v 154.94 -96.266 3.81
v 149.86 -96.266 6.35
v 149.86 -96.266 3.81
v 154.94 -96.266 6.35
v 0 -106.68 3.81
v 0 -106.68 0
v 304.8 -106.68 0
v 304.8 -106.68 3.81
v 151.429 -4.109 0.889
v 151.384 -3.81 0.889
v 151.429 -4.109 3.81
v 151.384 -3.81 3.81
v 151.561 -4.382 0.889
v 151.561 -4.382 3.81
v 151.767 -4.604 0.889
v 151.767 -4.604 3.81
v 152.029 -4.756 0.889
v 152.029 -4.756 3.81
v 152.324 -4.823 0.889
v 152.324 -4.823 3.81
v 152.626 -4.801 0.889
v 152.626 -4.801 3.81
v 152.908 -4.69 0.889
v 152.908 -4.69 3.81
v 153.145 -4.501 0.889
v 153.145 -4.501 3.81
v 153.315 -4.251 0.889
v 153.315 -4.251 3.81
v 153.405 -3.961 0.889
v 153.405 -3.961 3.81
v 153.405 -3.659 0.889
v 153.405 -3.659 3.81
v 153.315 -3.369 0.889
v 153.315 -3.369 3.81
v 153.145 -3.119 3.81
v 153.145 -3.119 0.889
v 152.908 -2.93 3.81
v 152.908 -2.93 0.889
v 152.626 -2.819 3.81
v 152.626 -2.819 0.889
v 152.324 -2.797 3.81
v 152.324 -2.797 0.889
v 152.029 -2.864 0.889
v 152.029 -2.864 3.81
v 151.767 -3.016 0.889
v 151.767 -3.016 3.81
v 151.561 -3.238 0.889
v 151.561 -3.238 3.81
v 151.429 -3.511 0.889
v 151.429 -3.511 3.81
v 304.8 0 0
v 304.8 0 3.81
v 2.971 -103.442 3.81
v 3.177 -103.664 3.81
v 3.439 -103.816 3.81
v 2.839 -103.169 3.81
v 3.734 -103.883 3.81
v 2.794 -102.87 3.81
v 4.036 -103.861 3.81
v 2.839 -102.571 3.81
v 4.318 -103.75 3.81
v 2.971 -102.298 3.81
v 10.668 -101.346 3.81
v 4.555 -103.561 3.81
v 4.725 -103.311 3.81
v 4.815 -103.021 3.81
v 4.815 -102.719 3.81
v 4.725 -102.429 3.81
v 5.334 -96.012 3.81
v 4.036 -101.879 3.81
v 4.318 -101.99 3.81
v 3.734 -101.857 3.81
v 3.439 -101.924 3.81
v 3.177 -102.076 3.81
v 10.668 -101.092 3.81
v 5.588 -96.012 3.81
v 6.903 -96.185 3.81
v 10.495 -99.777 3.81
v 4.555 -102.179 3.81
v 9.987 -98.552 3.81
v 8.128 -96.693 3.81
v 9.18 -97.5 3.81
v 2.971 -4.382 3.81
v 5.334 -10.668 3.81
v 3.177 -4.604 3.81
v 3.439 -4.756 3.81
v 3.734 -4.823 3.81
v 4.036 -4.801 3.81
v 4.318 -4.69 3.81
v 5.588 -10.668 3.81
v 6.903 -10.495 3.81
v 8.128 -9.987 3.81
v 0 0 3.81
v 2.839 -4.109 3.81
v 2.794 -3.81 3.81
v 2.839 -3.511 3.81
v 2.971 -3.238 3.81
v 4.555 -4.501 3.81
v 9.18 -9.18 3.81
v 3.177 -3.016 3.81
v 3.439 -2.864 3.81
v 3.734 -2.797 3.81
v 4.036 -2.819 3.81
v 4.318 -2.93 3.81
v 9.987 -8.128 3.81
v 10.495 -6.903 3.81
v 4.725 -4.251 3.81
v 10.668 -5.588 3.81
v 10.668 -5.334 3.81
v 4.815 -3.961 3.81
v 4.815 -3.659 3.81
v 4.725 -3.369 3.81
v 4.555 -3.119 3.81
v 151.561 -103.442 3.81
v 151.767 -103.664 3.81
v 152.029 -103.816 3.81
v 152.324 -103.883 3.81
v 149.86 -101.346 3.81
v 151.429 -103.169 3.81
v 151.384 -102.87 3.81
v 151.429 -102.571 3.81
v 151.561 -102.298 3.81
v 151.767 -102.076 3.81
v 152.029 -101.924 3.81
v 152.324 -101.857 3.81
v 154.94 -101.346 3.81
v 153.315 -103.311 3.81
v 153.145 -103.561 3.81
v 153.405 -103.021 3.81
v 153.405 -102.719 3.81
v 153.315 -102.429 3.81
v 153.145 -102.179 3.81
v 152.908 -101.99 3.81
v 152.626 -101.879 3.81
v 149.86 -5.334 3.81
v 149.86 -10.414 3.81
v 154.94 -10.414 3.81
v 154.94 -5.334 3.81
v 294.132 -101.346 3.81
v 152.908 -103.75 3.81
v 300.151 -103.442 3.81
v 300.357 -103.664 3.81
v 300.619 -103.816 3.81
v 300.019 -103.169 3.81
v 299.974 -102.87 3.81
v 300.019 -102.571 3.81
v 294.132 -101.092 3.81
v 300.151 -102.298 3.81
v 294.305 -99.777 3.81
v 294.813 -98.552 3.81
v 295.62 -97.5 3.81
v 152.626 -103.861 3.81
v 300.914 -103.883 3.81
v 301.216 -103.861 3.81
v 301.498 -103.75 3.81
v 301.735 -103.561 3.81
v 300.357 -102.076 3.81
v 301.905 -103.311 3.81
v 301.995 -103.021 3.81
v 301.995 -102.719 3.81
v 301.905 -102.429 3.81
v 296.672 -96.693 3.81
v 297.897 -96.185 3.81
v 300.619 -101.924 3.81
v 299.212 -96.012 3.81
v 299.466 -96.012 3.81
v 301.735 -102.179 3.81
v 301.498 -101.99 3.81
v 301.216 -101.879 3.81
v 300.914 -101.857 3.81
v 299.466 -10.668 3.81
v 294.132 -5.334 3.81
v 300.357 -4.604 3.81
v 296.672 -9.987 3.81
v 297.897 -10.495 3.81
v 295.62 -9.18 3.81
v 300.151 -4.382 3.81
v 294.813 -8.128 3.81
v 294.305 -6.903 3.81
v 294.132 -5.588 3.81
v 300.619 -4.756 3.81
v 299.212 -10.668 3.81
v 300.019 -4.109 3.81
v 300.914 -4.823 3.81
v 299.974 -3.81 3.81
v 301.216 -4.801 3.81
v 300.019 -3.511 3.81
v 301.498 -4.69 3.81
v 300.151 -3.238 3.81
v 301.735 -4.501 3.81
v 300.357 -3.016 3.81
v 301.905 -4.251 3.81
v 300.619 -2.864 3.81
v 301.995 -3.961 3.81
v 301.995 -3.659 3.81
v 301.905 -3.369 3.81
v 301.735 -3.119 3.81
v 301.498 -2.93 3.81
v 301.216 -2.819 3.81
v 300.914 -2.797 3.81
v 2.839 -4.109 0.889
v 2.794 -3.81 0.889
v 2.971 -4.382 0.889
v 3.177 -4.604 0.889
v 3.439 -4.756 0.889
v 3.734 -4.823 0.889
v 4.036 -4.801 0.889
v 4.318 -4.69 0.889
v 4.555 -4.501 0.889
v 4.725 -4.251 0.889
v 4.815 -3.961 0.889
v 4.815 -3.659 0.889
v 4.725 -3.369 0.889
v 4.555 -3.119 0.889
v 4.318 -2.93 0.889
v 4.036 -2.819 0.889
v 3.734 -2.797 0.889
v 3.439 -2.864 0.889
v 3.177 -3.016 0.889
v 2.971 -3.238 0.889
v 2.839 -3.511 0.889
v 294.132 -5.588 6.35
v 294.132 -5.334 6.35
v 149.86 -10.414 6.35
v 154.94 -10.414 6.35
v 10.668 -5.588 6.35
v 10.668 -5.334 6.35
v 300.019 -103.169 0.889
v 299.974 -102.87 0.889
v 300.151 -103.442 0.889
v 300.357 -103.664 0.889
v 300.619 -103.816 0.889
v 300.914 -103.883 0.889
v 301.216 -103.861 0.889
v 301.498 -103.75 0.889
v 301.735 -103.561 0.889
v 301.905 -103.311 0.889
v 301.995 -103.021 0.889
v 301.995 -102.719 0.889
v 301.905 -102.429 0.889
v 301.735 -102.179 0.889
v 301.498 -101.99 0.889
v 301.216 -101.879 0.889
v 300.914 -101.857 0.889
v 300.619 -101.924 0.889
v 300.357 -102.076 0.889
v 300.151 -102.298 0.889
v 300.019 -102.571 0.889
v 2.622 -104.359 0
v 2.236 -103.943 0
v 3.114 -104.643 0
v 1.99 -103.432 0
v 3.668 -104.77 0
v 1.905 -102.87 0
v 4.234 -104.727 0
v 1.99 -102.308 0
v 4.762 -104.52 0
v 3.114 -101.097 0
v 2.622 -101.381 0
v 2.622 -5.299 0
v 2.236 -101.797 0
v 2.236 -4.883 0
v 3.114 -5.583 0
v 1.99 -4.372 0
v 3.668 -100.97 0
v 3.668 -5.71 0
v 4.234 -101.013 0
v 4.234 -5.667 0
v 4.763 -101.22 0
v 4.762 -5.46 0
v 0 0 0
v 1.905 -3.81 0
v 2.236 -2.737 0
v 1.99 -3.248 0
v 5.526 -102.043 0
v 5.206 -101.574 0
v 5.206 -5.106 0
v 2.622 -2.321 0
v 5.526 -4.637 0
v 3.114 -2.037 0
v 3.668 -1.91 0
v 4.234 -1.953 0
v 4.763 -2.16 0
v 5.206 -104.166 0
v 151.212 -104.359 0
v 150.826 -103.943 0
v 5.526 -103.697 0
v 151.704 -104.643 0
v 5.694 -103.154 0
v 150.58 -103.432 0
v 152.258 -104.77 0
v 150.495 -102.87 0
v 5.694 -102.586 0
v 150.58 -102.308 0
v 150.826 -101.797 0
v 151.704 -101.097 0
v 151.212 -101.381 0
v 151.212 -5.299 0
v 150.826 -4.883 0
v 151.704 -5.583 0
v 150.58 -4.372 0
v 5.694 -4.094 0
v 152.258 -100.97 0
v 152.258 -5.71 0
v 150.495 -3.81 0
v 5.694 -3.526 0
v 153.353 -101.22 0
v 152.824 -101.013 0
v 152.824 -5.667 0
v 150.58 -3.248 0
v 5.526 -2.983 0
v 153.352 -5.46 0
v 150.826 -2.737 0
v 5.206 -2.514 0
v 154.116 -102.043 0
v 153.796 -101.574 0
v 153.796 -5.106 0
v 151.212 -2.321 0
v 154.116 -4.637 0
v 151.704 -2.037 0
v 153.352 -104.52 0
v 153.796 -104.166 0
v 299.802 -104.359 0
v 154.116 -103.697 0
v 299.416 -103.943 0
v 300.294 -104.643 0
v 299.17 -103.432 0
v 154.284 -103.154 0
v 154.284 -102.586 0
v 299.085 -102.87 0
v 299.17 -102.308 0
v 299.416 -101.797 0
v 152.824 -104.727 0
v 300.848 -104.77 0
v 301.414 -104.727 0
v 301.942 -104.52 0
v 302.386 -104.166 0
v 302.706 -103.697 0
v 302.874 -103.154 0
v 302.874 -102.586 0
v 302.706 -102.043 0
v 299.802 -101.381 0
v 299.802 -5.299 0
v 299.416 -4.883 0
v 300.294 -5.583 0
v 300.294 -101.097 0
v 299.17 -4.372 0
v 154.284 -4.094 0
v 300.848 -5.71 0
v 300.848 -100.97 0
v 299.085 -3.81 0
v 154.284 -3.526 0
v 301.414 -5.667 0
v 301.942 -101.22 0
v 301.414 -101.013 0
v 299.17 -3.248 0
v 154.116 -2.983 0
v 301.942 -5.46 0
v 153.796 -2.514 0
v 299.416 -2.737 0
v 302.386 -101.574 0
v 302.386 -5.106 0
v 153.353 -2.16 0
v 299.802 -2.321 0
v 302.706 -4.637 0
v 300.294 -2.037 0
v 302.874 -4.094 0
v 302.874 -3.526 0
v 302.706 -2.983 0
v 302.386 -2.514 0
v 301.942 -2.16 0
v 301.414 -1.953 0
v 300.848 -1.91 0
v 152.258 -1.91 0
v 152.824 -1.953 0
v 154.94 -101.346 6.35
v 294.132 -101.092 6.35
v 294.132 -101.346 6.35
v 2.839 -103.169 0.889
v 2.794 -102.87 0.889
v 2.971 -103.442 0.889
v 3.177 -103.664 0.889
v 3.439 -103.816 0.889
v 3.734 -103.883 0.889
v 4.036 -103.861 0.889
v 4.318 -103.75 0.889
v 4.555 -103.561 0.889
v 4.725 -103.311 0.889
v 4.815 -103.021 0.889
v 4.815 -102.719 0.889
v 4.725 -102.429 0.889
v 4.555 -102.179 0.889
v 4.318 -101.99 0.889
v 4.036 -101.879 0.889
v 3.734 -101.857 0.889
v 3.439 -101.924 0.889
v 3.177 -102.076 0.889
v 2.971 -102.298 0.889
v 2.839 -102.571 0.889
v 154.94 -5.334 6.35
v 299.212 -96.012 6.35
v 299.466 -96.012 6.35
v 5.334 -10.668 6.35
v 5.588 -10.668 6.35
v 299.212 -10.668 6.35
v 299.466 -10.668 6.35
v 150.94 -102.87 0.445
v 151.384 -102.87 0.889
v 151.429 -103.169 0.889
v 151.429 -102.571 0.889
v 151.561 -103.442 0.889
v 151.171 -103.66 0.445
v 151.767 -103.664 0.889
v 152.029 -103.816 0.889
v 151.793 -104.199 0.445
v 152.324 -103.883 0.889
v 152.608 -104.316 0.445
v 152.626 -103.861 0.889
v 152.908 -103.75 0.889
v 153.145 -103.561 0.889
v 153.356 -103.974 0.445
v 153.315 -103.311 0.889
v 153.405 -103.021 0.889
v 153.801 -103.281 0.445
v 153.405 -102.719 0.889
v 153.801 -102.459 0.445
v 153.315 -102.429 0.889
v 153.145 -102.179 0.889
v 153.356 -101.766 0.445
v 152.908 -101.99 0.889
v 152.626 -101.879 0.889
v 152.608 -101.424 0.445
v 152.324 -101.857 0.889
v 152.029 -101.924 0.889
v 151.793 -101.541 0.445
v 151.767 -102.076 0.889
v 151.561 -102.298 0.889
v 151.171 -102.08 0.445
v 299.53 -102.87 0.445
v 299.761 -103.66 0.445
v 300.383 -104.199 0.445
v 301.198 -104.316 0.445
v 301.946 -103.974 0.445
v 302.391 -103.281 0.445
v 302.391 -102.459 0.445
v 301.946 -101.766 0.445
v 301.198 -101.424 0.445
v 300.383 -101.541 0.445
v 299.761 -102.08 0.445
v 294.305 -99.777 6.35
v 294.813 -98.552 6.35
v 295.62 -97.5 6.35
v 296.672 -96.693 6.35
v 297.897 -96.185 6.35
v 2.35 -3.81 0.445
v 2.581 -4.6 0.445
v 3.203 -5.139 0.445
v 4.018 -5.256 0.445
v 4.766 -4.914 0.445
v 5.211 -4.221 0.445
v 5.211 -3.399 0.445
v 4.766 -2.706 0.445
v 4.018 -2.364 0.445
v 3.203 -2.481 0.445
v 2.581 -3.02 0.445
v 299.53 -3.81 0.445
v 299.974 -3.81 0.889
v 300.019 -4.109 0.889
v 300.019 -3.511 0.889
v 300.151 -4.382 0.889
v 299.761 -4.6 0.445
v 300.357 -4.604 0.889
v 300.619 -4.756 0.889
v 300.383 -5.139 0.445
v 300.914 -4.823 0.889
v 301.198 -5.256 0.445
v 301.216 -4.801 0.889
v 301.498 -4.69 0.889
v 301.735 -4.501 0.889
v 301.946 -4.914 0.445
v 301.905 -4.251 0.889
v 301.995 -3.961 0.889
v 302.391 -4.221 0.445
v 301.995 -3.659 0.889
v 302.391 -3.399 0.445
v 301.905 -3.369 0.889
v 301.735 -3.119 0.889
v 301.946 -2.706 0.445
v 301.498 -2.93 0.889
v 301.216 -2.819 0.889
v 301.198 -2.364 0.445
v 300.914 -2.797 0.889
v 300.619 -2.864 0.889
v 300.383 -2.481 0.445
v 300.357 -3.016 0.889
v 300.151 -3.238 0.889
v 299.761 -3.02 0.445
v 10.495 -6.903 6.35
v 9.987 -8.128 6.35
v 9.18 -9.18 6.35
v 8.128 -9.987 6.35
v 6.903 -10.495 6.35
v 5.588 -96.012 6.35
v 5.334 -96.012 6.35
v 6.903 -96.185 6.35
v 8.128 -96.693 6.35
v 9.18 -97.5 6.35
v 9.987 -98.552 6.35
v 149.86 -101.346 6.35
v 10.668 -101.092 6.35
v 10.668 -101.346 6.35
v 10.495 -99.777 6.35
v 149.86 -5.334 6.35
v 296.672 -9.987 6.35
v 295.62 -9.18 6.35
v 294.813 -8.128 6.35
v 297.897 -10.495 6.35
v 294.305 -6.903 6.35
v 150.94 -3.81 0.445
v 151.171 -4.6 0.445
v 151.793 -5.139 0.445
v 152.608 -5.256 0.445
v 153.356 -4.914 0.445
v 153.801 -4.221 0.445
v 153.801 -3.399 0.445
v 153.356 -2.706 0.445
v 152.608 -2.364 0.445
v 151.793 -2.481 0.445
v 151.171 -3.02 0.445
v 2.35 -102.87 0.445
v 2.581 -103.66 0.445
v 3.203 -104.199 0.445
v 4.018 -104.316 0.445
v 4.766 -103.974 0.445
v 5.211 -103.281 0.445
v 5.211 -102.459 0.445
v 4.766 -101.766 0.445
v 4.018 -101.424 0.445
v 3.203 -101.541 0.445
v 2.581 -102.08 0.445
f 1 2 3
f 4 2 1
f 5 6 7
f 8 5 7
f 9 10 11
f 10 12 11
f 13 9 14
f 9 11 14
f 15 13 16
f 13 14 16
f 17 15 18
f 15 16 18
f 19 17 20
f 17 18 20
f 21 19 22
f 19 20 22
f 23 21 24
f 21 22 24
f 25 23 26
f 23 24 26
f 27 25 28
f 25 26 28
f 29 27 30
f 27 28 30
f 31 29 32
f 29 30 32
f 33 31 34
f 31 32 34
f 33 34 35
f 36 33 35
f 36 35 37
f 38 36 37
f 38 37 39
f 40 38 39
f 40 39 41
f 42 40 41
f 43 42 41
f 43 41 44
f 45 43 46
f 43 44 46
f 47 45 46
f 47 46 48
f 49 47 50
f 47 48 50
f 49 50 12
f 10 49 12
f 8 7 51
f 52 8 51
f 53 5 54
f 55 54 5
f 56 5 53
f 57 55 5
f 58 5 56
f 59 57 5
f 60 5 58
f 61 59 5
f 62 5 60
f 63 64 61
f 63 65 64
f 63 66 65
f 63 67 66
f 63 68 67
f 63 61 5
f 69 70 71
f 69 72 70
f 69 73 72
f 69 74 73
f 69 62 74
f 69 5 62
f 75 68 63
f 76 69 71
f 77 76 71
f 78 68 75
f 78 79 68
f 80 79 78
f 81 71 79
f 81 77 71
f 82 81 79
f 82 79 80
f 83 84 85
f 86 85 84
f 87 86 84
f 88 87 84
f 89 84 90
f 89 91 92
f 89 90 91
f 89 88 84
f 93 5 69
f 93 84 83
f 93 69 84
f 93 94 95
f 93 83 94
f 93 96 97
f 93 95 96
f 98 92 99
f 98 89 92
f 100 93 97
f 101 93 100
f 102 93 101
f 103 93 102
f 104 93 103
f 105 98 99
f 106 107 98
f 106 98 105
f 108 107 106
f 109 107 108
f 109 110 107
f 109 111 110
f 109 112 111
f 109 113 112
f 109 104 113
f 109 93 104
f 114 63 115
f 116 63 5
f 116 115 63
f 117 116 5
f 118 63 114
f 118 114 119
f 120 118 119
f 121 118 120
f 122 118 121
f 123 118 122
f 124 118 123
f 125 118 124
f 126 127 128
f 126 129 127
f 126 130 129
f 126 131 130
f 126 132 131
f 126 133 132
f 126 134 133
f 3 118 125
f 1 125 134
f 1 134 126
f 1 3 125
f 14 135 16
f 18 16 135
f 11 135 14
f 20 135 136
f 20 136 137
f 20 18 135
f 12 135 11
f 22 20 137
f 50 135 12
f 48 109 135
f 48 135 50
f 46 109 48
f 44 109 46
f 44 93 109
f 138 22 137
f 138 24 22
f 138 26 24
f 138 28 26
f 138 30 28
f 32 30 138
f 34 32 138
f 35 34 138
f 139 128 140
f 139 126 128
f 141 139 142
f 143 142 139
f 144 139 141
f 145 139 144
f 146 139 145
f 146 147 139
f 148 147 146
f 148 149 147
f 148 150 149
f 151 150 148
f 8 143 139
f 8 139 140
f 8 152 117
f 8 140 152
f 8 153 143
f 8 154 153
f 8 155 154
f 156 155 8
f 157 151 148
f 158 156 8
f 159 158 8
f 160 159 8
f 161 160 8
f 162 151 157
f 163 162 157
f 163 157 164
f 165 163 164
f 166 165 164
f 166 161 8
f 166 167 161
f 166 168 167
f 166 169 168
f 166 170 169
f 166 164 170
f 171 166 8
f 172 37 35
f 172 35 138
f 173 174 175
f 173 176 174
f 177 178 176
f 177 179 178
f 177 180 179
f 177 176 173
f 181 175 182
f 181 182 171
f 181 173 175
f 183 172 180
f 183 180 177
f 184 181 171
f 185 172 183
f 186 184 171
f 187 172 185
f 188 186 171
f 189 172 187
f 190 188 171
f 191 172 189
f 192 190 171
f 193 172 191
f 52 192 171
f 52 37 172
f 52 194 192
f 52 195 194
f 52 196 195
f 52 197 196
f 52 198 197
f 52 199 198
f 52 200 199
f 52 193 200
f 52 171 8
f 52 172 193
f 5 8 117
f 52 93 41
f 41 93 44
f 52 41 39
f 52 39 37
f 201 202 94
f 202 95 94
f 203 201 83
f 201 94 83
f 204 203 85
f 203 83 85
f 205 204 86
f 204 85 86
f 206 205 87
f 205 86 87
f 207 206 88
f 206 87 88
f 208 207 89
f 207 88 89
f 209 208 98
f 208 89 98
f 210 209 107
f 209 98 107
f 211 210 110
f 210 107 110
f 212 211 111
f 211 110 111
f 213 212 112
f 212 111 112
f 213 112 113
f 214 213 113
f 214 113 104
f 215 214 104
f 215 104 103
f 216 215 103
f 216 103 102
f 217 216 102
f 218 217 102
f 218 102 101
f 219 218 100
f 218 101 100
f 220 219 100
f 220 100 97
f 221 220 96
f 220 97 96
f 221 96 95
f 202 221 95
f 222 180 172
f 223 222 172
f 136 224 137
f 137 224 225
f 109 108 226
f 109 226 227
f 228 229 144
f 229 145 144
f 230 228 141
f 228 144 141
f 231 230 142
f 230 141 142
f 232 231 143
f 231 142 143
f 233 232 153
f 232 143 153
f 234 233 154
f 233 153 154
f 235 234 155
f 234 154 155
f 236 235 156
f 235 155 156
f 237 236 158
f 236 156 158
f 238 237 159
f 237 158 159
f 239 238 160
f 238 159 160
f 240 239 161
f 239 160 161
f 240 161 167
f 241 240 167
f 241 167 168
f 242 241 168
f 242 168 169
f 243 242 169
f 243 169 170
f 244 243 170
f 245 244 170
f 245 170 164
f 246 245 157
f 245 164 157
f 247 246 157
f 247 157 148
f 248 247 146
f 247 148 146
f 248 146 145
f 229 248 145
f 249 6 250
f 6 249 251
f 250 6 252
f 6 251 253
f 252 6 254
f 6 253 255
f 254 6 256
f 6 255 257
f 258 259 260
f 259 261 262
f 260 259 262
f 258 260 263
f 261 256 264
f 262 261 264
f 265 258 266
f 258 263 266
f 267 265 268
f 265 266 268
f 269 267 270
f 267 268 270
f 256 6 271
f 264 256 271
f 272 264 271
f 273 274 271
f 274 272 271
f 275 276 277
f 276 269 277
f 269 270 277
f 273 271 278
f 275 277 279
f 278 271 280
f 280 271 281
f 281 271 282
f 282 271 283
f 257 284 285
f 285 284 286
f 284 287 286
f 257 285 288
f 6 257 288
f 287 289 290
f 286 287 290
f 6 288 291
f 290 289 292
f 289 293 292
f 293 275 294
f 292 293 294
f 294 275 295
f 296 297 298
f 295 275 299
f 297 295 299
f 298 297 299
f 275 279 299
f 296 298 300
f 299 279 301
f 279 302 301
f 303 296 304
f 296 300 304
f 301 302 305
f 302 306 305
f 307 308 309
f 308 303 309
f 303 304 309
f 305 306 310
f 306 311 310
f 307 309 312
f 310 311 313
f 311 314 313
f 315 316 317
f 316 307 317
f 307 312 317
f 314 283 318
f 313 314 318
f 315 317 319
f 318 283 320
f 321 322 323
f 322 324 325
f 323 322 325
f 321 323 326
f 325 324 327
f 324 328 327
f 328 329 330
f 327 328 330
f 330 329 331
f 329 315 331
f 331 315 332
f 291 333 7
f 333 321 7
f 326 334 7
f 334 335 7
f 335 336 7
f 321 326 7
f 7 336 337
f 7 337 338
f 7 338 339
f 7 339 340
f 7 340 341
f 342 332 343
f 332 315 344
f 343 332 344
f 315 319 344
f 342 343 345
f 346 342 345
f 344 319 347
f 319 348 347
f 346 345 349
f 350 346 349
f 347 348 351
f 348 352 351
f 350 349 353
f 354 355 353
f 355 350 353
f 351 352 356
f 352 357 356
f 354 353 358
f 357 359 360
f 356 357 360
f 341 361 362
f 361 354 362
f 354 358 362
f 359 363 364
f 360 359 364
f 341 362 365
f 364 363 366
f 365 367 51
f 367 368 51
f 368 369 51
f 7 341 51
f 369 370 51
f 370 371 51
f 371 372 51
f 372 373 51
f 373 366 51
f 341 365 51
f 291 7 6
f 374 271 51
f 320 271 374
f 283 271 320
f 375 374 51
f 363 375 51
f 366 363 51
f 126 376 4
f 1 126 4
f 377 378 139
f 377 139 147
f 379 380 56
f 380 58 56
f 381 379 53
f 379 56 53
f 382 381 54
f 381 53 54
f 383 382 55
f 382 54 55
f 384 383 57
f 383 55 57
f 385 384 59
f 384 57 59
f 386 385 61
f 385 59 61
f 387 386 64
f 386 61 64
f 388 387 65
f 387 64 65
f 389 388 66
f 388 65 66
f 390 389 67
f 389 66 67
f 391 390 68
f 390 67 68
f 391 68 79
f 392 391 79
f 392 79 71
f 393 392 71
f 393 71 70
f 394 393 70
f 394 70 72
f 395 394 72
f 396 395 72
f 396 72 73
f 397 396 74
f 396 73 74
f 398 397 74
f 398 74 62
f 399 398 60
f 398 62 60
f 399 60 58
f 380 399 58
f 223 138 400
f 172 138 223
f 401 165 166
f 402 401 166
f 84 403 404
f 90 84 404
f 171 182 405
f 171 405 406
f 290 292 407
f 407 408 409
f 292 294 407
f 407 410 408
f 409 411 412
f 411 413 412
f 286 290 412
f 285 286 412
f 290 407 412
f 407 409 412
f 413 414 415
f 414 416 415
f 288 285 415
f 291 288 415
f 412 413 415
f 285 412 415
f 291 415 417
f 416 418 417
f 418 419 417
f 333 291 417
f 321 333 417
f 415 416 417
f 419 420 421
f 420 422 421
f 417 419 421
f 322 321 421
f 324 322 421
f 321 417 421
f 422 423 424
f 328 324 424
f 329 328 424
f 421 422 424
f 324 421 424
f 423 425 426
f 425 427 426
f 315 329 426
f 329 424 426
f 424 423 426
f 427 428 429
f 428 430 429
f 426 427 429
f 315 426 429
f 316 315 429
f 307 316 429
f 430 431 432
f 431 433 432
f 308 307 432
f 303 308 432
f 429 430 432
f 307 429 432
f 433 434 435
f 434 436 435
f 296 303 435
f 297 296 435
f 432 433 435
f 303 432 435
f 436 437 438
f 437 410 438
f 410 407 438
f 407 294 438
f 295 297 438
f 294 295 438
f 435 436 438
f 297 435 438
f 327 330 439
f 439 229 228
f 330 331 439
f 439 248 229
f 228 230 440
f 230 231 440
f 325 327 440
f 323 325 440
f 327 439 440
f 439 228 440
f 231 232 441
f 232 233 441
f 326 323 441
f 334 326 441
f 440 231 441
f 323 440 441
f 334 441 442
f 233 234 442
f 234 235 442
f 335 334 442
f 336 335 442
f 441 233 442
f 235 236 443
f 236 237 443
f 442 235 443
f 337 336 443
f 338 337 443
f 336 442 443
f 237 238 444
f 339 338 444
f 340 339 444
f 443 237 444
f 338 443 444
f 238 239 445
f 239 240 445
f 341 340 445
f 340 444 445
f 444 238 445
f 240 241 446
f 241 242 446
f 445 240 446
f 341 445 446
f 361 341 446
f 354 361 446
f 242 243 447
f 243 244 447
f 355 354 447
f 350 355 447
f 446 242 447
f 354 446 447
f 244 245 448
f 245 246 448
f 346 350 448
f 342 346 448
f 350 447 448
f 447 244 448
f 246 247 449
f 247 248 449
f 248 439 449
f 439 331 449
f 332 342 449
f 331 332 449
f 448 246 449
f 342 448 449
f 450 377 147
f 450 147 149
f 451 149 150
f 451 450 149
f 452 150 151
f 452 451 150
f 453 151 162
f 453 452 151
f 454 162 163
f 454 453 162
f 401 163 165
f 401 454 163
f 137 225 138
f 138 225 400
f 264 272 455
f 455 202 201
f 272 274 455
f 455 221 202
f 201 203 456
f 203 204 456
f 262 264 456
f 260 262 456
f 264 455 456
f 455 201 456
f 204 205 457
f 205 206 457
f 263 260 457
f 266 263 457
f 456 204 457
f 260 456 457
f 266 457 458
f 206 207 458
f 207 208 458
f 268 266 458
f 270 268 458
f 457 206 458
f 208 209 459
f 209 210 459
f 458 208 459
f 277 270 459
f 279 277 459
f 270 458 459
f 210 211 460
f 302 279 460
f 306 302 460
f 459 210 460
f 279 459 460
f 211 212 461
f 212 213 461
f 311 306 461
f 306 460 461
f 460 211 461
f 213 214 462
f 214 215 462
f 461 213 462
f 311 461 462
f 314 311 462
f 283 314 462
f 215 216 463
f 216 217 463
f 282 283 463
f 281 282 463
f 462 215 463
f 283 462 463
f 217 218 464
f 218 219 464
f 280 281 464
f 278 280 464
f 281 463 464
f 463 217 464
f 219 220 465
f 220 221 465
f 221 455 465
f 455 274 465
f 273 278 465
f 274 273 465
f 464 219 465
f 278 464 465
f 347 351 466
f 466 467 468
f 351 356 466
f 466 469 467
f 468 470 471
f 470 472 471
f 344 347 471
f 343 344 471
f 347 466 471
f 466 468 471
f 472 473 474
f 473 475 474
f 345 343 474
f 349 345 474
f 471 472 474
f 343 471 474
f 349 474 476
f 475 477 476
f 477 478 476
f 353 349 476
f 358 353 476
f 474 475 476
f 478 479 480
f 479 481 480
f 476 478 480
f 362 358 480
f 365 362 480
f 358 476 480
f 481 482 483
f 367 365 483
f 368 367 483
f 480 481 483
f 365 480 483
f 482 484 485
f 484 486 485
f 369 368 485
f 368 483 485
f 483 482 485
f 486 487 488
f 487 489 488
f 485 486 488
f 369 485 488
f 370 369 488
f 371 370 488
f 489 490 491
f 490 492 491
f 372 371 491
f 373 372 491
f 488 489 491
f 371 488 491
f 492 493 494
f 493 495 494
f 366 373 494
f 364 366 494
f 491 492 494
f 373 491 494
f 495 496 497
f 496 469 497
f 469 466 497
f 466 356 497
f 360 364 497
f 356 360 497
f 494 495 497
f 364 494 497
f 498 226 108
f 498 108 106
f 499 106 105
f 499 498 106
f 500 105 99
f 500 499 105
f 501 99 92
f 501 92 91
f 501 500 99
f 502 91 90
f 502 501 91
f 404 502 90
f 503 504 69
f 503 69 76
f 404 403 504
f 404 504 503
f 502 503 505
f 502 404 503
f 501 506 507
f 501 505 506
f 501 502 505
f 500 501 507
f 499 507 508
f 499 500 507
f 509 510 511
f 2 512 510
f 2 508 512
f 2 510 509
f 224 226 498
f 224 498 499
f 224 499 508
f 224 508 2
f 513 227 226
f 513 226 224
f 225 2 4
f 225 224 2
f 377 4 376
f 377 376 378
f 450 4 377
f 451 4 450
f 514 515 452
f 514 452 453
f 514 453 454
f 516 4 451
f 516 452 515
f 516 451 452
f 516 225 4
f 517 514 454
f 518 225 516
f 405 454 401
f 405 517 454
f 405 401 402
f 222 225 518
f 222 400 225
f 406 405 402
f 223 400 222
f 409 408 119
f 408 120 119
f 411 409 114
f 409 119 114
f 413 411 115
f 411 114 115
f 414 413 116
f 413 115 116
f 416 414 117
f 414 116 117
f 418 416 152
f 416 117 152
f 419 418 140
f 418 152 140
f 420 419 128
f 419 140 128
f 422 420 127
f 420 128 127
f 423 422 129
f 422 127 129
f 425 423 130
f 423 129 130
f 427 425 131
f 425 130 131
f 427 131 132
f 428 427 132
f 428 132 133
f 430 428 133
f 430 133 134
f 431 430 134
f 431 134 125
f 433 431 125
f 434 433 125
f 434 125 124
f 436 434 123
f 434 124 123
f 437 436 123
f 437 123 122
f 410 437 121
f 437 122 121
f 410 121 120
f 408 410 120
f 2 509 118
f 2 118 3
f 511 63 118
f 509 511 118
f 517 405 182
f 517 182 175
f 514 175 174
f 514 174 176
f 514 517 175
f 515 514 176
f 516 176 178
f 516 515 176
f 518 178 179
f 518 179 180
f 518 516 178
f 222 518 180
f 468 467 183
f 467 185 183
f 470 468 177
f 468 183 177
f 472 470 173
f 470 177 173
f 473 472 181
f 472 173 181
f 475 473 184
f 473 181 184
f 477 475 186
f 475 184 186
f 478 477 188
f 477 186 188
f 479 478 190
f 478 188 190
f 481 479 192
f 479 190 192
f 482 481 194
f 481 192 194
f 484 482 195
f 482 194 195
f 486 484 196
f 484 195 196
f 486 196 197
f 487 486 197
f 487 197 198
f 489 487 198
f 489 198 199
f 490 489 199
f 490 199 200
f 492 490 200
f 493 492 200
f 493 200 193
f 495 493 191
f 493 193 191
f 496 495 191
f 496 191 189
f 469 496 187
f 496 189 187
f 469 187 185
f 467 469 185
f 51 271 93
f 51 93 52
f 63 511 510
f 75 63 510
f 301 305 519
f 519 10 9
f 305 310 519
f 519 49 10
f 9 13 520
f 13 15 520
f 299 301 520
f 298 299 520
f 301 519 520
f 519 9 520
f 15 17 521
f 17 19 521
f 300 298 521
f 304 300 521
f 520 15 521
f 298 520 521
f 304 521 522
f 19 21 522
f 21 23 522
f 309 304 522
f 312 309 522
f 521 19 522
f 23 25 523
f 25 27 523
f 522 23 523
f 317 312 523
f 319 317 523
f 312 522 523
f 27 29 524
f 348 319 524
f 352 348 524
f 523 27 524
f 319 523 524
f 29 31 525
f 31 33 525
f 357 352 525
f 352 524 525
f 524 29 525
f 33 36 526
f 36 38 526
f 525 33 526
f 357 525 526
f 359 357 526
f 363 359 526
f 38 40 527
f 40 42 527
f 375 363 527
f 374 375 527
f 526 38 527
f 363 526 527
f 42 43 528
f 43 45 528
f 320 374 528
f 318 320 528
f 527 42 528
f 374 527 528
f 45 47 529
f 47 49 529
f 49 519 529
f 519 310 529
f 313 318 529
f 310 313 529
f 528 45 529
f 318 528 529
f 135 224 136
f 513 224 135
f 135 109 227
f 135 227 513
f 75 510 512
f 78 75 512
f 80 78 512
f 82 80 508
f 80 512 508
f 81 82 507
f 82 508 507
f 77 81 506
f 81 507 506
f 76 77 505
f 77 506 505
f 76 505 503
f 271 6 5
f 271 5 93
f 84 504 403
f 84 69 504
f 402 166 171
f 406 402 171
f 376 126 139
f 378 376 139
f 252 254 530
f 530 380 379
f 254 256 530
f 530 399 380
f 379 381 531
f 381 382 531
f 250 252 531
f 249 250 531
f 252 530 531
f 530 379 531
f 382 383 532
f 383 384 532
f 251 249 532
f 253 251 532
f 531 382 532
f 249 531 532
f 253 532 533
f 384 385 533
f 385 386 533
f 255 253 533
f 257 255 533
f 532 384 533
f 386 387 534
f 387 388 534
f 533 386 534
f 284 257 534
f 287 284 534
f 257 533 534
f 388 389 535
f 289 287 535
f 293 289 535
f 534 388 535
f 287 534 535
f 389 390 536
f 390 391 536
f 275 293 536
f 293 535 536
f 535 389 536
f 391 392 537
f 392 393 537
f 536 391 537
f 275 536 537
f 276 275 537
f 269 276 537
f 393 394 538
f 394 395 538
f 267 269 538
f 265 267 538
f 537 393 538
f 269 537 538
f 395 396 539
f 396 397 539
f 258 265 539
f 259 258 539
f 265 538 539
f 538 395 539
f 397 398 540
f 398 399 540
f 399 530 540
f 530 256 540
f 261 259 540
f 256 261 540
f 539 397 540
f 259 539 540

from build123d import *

# Parameters (mm, degrees)
F0_W            = 304.8
F0_H            = 106.68
F1_DEPTH        = 3.81
F2_W            = 294.132
F2_H            = 96.012
F3_DEPTH        = 2.54
F4_W            = 5.334
F4_H            = 5.334
F4_W_2          = 5.08
F4_H_2          = 5.08
F5_DEPTH        = 25.4
F6_R            = 5.08
F7_DEPTH        = 27.94
F9_DEPTH        = 27.94
F10_D           = 2.032
F10_DEPTH       = 12.7
F10_CSINK_D     = 3.81
F10_CSINK_ANGLE = 90
F10_TIP         = 0.6104743889


with BuildPart() as f1:
    # F0 (on Top) → F1 (new body)
    with BuildSketch(Plane.XY):
        with Locations((152.4, -53.34)):
            Rectangle(F0_W, F0_H)
    extrude(amount=F1_DEPTH)

    # F2 (on face) → F3 (join)
    with BuildSketch(Plane.XY.offset(3.81)):
        with Locations((152.4, -53.34)):
            Rectangle(F2_W, F2_H)
    extrude(amount=F3_DEPTH)

    # F4 (on face) → F5 (join)
    with BuildSketch(Plane.XY.offset(6.35)):
        with Locations((8.001, -8.001)):
            Rectangle(F4_W, F4_H)
        with Locations((8.001, -98.679)):
            Rectangle(F4_W, F4_H)
        with Locations((296.799, -8.001)):
            Rectangle(F4_W, F4_H)
        with Locations((296.799, -98.679)):
            Rectangle(F4_W, F4_H)
        with Locations((152.4, -7.874)):
            Rectangle(F4_W_2, F4_H_2)
        with Locations((152.4, -98.806)):
            Rectangle(F4_W_2, F4_H_2)
    extrude(amount=F5_DEPTH)

    # F6
    f6_edges = [f1.edges().sort_by_distance(p)[0] for p in [
        (294.132, -96.012, 19.05),
        (294.132, -10.668, 19.05),
        (10.668, -10.668, 19.05),
        (10.668, -96.012, 19.05),
    ]]
    fillet(f6_edges, radius=F6_R)

    # F7 (cut): faces of the model
    f7_faces = [f1.faces().sort_by_distance(p)[0] for p in [
        (7.6306507319, -7.6306507319, 31.75),
        (7.6306507319, -99.0493492681, 31.75),
        (297.1693492681, -7.6306507319, 31.75),
        (297.1693492681, -99.0493492681, 31.75),
    ]]
    extrude(f7_faces, amount=-F7_DEPTH, mode=Mode.SUBTRACT)

    # F9 (cut): faces of the model
    f9_faces = [f1.faces().sort_by_distance(p)[0] for p in [
        (152.4, -7.874, 31.75),
        (152.4, -98.806, 31.75),
    ]]
    extrude(f9_faces, amount=-F9_DEPTH, mode=Mode.SUBTRACT)

    # F10
    with Locations(Plane(origin=(0, 0, 0), x_dir=(1, 0, 0), z_dir=(0, 0, -1))):
        with Locations((3.81, 102.87), (3.81, 3.81), (300.99, 102.87), (300.99, 3.81), (152.4, 3.81), (152.4, 102.87)):
            CounterSinkHole(F10_D / 2, F10_CSINK_D / 2, depth=F10_DEPTH, counter_sink_angle=F10_CSINK_ANGLE)
            with Locations((0, 0, -(F10_DEPTH + F10_TIP / 2))):  # 118° drill point
                Cone(0, F10_D / 2, F10_TIP, mode=Mode.SUBTRACT)


solid = f1.part
